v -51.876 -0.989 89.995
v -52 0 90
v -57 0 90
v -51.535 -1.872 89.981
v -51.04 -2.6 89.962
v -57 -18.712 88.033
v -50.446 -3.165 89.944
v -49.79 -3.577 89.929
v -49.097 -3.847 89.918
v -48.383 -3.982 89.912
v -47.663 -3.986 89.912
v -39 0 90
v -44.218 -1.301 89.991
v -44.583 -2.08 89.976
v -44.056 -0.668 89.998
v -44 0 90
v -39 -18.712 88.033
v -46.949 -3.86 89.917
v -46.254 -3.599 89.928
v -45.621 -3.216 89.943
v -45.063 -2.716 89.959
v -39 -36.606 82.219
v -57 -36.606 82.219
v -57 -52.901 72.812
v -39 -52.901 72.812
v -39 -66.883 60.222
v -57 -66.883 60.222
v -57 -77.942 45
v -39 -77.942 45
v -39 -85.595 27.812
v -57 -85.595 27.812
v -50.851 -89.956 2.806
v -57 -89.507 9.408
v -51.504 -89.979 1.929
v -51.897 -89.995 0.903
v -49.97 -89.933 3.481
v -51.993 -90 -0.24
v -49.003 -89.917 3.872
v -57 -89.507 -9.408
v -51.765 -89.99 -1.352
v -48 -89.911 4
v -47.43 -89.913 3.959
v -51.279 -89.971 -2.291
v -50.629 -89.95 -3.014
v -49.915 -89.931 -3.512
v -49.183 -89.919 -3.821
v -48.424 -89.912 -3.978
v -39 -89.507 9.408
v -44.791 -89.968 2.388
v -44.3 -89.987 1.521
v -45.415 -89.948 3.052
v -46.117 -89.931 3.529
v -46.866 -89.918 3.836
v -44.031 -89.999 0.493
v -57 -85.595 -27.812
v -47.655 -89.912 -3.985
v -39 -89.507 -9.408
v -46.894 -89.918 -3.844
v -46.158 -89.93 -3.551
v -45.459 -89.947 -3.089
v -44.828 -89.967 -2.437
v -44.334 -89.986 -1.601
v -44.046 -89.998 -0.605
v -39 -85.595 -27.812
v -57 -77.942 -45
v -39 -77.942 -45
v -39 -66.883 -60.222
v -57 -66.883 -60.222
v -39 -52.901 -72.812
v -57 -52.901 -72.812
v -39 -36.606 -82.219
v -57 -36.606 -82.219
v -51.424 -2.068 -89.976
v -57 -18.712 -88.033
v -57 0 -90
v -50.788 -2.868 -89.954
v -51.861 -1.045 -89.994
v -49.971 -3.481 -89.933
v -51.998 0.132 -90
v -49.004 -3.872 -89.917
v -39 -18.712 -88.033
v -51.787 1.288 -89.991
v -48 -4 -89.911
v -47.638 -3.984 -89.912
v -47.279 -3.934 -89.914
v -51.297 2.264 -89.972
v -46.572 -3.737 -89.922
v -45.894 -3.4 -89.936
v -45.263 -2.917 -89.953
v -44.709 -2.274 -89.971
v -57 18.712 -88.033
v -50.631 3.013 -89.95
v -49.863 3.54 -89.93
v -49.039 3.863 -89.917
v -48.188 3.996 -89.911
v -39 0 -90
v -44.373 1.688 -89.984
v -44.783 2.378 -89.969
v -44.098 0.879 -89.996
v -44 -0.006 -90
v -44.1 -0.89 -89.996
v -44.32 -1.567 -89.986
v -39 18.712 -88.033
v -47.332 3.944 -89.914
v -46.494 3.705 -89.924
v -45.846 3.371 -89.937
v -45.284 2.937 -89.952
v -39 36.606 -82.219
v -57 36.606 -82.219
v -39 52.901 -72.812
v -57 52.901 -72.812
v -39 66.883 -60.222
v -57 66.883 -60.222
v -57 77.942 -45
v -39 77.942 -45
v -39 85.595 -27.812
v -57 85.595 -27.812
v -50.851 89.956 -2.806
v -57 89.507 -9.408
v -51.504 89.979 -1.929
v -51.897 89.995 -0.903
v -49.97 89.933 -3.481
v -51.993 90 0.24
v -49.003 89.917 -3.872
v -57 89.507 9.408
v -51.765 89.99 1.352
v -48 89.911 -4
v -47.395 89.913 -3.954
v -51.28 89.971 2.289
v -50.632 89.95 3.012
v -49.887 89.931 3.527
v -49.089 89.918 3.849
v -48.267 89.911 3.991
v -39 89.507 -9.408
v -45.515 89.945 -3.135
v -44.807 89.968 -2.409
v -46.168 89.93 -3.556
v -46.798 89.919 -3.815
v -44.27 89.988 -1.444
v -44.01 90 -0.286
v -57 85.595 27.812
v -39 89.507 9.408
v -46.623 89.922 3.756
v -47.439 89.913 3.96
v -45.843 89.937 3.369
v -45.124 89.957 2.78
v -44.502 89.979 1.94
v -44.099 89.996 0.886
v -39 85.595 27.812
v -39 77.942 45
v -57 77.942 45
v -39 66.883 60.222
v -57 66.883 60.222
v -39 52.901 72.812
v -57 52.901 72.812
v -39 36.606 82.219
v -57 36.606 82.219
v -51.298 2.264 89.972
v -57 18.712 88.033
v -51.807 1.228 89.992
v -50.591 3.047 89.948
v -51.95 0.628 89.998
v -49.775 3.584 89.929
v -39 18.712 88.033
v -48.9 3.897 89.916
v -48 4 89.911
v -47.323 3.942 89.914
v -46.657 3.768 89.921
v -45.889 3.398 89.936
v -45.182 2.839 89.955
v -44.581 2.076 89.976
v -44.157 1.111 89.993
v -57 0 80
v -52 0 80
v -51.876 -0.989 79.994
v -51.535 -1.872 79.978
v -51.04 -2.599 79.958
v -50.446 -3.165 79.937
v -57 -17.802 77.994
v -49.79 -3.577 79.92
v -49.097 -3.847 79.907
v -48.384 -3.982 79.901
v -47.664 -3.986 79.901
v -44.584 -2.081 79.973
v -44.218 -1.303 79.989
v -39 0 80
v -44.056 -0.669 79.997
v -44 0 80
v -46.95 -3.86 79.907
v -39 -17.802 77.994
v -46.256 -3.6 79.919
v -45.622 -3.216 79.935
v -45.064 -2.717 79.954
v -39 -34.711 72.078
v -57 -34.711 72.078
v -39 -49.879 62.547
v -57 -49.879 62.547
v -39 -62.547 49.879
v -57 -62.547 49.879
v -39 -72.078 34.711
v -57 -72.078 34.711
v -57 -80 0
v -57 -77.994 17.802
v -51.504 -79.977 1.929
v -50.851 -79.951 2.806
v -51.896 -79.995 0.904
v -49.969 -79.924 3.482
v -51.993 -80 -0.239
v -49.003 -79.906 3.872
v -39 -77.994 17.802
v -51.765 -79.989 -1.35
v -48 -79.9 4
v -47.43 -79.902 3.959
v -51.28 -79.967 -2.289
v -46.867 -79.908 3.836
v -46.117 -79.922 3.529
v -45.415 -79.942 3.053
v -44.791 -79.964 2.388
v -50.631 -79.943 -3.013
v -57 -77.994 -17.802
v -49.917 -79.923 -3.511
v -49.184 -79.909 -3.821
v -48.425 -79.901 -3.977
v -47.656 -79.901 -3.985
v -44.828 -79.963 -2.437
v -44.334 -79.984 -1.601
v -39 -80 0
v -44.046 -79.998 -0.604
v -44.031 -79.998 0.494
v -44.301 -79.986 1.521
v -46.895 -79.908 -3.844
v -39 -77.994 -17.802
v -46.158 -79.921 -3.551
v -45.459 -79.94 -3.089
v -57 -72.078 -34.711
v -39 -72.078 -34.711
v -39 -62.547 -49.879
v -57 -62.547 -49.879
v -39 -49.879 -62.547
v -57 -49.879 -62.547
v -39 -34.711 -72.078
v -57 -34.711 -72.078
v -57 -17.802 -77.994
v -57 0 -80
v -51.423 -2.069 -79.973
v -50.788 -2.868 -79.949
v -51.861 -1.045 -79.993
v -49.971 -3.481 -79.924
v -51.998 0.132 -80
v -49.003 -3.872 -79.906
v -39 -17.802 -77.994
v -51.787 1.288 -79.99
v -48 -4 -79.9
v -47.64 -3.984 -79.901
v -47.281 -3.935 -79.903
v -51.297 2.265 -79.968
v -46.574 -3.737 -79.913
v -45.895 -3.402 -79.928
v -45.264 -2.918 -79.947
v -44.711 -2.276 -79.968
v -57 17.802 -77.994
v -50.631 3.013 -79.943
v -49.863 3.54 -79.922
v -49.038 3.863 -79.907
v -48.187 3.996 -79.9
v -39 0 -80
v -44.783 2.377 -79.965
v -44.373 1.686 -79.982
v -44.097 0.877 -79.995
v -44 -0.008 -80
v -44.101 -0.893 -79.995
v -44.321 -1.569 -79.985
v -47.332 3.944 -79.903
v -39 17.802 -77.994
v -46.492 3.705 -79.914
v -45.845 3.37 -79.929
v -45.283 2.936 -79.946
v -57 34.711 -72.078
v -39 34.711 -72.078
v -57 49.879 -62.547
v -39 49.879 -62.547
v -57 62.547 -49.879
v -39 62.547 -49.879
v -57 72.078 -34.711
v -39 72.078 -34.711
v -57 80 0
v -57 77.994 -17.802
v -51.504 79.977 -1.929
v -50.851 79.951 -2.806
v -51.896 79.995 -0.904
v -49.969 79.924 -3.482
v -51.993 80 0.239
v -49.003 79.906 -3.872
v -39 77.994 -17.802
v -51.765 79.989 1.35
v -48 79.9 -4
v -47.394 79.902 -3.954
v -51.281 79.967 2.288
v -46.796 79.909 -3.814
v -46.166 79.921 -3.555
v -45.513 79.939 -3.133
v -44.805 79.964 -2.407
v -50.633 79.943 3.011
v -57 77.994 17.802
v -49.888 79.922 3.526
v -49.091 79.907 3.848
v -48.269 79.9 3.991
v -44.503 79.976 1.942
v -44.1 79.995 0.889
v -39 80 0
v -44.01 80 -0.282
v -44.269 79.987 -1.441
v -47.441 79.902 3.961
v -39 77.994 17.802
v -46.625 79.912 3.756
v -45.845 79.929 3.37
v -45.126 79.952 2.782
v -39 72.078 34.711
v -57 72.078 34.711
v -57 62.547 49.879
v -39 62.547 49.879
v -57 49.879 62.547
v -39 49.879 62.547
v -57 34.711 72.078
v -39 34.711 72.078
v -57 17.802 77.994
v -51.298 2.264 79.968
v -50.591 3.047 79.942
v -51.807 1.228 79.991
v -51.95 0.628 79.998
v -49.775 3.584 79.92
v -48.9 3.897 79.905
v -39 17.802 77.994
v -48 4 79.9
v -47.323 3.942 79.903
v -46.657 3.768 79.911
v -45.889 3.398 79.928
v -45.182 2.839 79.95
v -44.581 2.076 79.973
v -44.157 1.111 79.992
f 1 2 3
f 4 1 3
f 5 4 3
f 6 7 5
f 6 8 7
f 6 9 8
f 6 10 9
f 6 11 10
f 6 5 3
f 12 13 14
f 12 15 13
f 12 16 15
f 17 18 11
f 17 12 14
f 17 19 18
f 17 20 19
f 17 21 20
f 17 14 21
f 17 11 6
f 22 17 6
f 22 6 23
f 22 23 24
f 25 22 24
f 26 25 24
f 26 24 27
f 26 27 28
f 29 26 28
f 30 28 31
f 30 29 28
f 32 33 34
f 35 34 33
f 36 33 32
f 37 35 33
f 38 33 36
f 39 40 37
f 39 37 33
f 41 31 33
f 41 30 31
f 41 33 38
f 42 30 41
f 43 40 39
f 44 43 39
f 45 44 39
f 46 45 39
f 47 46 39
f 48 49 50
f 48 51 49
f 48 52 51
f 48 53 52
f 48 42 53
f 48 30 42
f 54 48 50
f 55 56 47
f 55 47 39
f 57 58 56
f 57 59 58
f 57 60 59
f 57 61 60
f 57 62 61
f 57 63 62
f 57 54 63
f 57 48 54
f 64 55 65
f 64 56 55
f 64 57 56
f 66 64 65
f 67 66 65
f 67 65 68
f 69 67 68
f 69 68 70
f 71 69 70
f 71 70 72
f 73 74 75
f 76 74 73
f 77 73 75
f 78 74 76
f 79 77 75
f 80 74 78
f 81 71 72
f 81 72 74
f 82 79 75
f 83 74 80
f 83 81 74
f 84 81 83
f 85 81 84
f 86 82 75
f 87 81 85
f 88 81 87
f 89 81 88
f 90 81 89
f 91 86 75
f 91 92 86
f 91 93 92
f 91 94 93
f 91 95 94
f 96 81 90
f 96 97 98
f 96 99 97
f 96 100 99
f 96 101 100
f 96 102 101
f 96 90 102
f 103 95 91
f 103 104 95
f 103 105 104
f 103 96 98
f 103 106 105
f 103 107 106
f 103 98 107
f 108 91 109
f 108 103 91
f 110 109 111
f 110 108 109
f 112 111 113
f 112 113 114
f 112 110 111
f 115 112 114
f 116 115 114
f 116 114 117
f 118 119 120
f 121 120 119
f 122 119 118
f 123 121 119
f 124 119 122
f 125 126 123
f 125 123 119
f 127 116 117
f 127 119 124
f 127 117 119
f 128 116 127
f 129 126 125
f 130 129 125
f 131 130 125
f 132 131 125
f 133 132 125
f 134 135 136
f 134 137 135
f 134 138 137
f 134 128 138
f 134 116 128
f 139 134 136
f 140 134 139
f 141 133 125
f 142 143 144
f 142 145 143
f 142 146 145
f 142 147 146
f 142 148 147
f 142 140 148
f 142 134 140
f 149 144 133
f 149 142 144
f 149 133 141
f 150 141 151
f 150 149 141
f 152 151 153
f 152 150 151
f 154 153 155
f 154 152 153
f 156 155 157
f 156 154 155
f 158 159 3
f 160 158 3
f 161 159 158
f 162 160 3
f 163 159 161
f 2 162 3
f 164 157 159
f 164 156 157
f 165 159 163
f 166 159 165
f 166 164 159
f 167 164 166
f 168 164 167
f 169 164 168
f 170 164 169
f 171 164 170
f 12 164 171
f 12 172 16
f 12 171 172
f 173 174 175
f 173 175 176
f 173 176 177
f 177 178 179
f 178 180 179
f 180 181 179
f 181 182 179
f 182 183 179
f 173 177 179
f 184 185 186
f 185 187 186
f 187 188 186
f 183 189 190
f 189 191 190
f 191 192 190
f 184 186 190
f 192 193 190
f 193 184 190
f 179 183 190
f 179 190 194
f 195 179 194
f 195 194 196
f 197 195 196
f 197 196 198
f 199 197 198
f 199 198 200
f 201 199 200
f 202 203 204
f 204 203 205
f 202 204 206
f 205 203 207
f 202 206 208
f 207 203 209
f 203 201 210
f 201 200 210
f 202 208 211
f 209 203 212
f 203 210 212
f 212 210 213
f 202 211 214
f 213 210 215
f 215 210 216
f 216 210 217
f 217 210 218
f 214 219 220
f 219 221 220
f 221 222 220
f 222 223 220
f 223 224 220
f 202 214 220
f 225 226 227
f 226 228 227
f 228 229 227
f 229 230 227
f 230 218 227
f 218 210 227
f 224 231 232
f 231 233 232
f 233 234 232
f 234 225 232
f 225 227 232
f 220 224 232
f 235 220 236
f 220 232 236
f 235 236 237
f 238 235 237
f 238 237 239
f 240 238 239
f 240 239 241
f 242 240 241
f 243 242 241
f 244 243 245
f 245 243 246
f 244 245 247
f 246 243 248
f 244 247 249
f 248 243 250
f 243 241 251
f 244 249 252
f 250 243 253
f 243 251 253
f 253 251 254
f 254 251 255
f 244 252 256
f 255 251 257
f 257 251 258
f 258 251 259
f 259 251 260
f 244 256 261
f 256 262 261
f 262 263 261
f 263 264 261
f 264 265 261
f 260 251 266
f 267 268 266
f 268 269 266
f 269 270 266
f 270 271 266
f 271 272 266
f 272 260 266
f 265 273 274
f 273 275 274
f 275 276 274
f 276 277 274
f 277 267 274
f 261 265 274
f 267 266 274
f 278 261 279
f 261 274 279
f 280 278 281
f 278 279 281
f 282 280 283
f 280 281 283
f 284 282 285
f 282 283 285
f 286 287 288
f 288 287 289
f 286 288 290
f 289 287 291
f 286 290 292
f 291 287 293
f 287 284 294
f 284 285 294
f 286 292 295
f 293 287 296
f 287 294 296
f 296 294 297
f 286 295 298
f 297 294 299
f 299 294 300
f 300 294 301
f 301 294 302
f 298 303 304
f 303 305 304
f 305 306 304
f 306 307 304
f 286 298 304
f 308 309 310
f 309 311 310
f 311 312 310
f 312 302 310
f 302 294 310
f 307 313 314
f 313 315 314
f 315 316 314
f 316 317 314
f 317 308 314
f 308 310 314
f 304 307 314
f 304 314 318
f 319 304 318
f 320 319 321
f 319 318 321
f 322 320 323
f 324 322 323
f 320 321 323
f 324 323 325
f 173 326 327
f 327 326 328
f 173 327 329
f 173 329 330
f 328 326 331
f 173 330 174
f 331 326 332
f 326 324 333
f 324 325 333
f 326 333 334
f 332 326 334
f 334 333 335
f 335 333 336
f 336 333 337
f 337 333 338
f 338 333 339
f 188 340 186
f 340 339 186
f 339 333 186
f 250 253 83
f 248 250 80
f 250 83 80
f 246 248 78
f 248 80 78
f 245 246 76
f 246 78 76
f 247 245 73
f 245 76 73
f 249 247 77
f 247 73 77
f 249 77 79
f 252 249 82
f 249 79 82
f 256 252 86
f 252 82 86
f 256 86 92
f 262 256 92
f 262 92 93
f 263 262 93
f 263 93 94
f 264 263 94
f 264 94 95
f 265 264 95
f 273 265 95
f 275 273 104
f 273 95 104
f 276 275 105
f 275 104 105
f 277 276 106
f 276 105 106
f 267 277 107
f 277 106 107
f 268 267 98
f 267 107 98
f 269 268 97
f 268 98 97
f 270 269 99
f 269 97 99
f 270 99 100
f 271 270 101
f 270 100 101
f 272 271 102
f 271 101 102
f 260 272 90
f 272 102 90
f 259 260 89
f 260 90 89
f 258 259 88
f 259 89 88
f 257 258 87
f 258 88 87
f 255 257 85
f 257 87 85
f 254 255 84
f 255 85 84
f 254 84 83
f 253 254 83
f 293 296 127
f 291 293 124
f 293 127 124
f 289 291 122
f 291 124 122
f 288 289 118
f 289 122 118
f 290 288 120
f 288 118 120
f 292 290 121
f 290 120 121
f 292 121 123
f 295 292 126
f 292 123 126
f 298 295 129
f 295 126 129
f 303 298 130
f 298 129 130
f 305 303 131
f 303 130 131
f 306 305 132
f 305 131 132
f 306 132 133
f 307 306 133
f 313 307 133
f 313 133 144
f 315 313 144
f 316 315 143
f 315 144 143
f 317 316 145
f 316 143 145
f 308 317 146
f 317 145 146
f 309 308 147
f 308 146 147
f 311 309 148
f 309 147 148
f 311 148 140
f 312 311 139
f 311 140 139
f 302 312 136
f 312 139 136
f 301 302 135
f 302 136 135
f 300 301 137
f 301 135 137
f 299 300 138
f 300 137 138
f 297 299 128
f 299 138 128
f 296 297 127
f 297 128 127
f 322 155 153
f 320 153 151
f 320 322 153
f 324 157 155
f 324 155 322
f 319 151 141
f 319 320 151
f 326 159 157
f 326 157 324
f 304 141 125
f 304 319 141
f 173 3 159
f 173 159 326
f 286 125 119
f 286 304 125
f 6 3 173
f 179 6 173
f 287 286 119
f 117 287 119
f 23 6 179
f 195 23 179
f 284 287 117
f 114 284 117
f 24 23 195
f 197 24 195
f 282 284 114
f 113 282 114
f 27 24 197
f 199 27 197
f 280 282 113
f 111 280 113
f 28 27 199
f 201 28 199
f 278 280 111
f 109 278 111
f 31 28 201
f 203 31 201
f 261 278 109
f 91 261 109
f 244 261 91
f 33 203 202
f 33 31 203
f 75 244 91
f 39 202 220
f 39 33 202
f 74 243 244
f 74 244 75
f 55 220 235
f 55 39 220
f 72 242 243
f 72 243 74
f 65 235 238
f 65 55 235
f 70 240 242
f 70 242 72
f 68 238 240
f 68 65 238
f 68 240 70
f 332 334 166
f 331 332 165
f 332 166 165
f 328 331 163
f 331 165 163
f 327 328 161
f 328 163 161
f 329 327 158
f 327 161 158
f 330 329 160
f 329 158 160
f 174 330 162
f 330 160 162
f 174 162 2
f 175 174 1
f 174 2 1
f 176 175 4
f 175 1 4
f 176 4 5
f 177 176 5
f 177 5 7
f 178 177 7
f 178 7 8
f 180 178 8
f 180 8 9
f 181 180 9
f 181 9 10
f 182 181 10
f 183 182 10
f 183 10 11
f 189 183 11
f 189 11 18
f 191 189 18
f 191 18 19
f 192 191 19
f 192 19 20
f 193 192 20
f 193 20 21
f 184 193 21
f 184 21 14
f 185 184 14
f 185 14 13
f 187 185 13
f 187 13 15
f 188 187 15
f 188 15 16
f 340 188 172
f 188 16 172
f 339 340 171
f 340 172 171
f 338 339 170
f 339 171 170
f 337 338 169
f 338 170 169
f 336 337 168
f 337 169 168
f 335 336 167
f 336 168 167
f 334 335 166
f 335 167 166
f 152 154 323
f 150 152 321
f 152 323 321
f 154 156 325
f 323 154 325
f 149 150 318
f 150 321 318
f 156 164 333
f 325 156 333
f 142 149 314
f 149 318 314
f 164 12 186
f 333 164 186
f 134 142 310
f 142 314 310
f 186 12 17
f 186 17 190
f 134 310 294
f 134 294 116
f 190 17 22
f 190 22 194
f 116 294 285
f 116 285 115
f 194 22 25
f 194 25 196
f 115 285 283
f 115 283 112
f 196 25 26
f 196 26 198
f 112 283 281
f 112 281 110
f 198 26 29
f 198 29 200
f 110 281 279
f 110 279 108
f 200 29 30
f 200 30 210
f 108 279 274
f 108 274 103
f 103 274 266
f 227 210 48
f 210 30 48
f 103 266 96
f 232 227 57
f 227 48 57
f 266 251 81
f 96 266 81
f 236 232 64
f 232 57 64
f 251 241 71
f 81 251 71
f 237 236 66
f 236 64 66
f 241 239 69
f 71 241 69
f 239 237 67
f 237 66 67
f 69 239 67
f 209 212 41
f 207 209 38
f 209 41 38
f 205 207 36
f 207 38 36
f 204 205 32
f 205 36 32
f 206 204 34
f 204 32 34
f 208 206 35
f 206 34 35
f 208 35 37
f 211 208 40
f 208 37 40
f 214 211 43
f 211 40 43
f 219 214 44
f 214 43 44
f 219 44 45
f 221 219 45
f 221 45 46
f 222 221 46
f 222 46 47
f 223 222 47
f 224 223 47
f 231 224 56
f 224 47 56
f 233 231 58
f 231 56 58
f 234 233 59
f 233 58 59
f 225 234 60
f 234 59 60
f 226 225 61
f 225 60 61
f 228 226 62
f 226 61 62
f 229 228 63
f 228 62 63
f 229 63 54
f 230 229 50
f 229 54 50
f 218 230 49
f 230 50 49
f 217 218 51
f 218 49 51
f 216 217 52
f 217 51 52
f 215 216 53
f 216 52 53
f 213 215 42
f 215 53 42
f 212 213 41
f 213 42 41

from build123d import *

# Parameters (mm, degrees)
RING_SKETCH_W          = 18
RING_SKETCH_H          = 10
BUSHING_BORE_SKETCH_W  = 4
BUSHING_BORE_SKETCH_H  = 12
BUSHING_BORES_X4_COUNT = 4


with BuildPart() as part:
    # Ring Sketch → Ring (revolve)
    with BuildSketch(Plane.XY, mode=Mode.PRIVATE) as ring_sk:
        with Locations((-48, 85)):
            Rectangle(RING_SKETCH_W, RING_SKETCH_H)
    revolve(ring_sk.sketch.rotate(Axis((-108, 0, 0), (1, 0, 0)), 90), axis=Axis((-108, 0, 0), (1, 0, 0)))

    # Bushing Bore Sketch → Bushing Bore (revolve, cut)
    with BuildSketch(Plane.XY, mode=Mode.PRIVATE) as bushing_bore_sk:
        with Locations((-46, 85)):
            Rectangle(BUSHING_BORE_SKETCH_W, BUSHING_BORE_SKETCH_H)
    bushing_bore = revolve(bushing_bore_sk.sketch.rotate(Axis((-48, 70, 0), (0, 1, 0)), 90), axis=Axis((-48, 70, 0), (0, 1, 0)), mode=Mode.SUBTRACT)

    # Bushing Bores x4: Bushing Bore ×4 about axis
    bushing_bores_x4_axis = Axis((-38.1, 0, 0), (-1, 0, 0))
    for i in range(1, BUSHING_BORES_X4_COUNT):
        add(bushing_bore.rotate(bushing_bores_x4_axis, i * 360 / BUSHING_BORES_X4_COUNT), mode=Mode.SUBTRACT)


solid = part.part
